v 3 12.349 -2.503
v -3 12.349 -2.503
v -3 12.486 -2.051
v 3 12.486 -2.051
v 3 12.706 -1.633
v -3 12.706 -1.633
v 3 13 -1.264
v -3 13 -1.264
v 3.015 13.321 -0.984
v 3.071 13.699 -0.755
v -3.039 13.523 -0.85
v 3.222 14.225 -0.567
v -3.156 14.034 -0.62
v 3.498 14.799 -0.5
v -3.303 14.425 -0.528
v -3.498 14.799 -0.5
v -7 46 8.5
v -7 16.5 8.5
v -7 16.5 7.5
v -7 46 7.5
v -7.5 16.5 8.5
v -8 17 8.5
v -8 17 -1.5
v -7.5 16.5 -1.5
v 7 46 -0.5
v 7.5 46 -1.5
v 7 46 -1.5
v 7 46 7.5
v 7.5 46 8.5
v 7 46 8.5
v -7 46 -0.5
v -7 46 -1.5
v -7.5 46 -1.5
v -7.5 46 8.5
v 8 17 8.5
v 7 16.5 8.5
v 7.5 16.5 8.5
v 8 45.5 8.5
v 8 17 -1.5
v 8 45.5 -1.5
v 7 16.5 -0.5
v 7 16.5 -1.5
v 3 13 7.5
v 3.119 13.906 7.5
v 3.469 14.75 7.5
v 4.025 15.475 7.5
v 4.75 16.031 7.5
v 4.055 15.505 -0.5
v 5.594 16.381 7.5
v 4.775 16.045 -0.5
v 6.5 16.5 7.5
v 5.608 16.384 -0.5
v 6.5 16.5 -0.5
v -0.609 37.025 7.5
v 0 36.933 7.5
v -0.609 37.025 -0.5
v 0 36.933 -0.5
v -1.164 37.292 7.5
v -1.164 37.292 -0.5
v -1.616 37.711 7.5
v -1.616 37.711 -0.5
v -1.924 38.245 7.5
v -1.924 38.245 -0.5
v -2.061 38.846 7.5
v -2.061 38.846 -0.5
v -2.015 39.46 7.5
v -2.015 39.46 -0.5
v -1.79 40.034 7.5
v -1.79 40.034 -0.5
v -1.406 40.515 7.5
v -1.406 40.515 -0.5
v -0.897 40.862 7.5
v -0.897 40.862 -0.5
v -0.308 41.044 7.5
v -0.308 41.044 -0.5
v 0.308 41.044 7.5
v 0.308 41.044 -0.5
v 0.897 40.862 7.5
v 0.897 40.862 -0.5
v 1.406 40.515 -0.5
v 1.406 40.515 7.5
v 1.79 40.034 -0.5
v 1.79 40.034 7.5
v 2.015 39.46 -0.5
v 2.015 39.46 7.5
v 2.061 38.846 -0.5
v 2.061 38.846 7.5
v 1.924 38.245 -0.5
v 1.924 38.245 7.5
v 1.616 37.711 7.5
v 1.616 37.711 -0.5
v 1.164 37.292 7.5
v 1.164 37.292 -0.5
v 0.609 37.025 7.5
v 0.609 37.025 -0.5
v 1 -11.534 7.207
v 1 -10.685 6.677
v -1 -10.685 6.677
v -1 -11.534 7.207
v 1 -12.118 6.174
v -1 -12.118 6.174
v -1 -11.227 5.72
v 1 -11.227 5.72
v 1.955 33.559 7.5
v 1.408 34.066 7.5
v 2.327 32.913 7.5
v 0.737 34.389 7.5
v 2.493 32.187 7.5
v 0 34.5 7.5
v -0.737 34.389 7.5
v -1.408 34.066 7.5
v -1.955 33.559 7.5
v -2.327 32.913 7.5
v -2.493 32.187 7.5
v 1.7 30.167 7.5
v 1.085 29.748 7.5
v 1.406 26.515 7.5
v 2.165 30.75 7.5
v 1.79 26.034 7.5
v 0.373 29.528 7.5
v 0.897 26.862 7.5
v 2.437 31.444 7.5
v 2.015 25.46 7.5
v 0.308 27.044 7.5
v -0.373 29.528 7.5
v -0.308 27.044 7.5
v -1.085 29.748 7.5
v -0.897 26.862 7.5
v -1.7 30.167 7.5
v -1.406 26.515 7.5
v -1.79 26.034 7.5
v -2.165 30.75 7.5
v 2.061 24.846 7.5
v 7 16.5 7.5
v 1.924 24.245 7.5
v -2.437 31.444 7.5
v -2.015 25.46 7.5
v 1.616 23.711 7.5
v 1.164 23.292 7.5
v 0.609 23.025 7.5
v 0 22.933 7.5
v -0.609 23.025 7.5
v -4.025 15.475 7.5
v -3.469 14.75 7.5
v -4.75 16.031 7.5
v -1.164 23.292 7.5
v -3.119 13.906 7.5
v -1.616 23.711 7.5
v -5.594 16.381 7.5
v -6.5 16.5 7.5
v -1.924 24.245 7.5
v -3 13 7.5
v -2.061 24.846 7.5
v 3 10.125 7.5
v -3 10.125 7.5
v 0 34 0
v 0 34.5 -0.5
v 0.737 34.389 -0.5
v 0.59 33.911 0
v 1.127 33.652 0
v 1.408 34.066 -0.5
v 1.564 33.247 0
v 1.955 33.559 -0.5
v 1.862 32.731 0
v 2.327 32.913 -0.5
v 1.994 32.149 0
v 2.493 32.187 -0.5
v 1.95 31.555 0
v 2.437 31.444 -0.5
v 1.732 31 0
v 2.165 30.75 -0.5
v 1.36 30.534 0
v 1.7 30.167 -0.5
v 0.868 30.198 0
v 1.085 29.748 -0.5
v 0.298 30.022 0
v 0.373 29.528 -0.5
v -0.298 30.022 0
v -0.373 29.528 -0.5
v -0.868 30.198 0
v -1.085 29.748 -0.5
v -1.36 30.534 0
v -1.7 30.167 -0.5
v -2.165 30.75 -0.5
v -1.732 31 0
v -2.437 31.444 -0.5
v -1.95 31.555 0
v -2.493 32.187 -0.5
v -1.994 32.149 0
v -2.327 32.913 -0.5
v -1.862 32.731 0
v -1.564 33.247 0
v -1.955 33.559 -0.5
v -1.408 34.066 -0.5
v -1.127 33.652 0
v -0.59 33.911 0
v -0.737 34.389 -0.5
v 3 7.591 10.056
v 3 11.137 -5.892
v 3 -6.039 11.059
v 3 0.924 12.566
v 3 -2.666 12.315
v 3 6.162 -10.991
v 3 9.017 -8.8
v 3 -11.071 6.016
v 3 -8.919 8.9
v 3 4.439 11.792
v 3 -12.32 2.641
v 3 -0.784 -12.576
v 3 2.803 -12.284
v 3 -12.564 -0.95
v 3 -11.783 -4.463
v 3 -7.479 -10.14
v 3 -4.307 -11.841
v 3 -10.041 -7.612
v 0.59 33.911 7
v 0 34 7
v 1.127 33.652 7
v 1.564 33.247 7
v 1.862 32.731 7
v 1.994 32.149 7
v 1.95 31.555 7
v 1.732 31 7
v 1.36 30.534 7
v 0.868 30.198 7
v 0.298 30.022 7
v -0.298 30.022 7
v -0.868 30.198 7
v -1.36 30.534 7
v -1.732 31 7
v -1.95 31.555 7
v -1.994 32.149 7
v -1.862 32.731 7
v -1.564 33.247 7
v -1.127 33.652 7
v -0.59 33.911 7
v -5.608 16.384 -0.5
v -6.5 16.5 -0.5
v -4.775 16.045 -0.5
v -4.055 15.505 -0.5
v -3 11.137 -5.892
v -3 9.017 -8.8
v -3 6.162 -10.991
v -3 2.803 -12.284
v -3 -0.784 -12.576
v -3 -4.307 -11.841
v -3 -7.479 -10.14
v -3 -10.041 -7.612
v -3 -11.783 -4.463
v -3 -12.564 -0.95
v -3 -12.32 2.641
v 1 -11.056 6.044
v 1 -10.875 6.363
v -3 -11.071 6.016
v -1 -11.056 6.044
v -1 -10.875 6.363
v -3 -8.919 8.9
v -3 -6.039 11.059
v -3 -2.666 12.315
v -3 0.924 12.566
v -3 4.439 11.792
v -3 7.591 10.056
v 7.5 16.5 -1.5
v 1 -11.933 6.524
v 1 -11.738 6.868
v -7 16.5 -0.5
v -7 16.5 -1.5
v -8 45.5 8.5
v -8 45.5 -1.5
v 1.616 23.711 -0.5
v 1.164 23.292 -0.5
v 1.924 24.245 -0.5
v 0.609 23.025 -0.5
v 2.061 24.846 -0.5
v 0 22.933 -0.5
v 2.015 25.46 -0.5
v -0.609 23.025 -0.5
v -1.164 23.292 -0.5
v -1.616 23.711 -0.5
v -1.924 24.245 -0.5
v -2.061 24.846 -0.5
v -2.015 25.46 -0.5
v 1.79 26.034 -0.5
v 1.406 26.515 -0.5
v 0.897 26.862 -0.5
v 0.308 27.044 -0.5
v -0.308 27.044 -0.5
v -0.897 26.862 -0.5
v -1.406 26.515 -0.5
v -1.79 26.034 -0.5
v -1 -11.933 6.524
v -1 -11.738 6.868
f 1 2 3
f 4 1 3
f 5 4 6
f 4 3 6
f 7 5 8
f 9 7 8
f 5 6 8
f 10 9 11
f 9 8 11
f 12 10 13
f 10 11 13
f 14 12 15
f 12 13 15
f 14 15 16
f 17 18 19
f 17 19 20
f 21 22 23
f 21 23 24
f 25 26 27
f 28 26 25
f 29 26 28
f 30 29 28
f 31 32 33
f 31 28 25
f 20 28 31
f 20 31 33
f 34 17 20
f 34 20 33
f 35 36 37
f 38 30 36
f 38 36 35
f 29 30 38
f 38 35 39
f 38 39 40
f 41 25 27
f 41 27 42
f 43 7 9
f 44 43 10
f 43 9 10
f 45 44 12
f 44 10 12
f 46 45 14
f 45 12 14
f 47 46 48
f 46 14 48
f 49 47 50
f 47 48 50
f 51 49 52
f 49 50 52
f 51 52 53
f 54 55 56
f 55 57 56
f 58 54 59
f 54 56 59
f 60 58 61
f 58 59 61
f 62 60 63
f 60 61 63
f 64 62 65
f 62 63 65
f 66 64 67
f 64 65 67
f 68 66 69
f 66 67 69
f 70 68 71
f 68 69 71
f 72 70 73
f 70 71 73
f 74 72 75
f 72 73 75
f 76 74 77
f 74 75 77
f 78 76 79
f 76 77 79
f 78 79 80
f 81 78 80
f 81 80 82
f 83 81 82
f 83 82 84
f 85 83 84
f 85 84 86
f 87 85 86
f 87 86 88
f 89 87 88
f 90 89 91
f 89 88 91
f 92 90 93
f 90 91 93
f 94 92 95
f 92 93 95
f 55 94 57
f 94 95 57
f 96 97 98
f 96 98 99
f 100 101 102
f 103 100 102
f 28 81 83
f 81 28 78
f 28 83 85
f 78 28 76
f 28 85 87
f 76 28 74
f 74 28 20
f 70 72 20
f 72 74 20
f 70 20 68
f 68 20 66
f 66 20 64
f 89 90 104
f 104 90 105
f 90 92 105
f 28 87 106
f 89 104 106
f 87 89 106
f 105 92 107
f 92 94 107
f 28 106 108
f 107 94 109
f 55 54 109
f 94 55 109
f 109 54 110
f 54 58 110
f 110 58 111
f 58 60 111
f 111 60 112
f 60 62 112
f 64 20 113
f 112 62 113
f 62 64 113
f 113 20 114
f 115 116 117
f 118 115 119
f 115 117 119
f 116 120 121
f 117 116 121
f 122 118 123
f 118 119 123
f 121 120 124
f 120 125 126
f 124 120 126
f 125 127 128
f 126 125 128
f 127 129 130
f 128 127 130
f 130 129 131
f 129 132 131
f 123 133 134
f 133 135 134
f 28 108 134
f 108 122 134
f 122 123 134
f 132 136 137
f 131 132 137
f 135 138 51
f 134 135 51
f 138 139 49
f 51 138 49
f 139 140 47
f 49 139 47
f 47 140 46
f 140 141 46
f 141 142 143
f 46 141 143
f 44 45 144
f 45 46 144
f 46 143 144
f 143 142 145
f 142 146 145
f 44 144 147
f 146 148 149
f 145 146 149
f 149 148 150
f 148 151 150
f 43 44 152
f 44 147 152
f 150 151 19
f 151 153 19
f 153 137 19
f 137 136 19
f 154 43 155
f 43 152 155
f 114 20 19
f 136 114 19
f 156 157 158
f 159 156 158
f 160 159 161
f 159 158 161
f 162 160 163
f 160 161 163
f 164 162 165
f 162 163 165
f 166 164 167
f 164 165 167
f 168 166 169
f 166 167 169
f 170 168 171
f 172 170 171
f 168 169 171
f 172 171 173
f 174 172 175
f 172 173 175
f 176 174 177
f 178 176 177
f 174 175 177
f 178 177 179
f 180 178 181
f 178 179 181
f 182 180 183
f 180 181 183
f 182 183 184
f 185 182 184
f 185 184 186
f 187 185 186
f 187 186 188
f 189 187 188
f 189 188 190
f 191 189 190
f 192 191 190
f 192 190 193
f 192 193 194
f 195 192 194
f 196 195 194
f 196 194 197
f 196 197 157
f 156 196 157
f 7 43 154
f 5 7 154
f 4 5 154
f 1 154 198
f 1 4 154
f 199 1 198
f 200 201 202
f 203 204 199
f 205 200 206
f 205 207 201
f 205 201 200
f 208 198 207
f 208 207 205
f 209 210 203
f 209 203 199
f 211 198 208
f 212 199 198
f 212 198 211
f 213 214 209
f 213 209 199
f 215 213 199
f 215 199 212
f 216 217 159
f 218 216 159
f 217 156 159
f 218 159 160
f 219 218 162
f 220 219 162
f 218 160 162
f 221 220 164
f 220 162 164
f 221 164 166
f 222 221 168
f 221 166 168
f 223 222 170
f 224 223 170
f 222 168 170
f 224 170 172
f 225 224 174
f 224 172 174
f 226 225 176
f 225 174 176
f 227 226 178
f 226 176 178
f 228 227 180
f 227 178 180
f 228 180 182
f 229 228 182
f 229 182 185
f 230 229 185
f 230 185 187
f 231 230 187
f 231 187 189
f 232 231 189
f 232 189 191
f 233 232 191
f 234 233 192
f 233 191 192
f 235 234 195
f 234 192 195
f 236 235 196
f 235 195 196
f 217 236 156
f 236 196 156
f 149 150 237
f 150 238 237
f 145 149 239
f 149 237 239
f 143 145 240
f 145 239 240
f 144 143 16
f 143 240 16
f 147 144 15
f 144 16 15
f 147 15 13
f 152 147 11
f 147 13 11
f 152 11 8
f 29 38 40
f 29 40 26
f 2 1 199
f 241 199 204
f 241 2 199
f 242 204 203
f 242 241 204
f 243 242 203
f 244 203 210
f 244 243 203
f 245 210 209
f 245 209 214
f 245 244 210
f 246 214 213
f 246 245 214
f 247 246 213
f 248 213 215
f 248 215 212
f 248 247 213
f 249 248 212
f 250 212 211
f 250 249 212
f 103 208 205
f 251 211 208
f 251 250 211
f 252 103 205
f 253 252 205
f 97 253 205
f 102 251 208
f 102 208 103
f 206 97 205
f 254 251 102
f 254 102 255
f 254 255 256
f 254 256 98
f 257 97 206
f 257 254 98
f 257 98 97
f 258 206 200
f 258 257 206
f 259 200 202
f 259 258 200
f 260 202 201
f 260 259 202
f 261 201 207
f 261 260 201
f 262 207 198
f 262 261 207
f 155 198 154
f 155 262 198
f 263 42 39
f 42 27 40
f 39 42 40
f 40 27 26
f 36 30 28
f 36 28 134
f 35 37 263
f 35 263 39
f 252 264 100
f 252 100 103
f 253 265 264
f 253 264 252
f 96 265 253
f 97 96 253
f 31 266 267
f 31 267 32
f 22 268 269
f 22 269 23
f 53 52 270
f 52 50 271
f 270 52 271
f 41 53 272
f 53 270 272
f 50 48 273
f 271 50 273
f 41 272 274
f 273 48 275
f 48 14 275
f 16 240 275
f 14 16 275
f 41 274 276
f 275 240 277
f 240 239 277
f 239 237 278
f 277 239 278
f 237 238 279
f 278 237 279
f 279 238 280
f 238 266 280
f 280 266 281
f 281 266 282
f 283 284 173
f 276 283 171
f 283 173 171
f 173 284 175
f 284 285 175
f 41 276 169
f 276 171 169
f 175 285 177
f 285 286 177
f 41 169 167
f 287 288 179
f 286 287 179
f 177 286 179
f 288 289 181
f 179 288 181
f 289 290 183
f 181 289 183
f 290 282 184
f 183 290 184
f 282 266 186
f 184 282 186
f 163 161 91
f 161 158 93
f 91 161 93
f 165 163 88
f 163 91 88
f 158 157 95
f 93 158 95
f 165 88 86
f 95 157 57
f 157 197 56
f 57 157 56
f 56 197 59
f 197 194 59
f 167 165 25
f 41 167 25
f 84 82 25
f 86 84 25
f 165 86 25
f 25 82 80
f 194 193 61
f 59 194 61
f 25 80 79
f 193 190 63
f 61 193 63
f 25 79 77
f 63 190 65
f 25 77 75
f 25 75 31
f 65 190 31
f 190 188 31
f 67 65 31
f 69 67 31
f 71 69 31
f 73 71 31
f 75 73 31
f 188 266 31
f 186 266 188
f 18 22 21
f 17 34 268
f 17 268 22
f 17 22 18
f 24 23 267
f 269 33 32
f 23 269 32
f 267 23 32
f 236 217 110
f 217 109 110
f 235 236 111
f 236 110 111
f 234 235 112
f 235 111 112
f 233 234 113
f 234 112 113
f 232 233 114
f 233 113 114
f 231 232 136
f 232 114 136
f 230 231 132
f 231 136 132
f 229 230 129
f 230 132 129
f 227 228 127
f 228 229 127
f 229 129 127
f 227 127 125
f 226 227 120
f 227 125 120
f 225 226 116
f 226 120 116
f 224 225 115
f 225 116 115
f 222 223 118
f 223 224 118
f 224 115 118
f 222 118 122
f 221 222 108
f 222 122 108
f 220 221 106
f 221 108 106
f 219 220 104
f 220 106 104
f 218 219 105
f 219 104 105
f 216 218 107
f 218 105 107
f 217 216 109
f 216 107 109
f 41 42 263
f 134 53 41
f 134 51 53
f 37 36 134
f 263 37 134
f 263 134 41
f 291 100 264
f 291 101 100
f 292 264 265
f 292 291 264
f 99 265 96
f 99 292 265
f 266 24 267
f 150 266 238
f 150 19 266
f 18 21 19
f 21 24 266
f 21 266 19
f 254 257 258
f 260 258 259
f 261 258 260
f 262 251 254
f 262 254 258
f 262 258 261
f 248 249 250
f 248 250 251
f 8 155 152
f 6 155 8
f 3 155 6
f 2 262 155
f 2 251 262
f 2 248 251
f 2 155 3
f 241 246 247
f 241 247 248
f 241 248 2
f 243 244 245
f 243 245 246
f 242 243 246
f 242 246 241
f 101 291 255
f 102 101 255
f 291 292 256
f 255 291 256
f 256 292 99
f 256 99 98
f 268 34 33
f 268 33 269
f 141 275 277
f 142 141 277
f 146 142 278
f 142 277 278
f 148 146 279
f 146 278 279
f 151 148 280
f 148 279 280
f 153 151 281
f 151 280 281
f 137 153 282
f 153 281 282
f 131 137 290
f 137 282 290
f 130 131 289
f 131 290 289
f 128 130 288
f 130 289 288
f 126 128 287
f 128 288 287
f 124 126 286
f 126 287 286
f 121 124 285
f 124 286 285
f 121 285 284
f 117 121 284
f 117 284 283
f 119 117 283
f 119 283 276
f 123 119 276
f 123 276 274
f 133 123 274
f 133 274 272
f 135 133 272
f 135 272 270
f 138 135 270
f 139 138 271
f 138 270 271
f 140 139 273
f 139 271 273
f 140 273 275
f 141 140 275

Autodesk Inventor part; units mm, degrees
sketch "Sketch_1" plane through (0, 0, 0) normal (1, 0, 0) x (0, 1, 0)
  arc A0 (10.1247, 7.5) -> (12.3488, -2.5033) centre (0, 0) ccw
  arc A1 (14.799, -0.5) -> (12.3488, -2.5033) centre (14.799, -3) ccw
  line L0 (14.799, -0.5) -> (46, -0.5)
  line L1 (46, -0.5) -> (46, 7.5)
  line L2 (46, 7.5) -> (10.1247, 7.5)
extrude "Extrusion1" add sketch "Sketch_1" along normal mid plane 14
sketch "Sketch_2" plane through (0, 0, 0) normal (0, 0, 1) x (1, 0, 0)
  line L0 (-7, -24.7) -> (7, -24.7)
  line L1 (7, -24.7) -> (7, 16.5)
  line L2 (7, 16.5) -> (6.5, 16.5)
  arc A0 (6.5, 16.5) -> (3, 13) centre (6.5, 13) ccw
  line L3 (3, 13) -> (3, -21.7)
  line L4 (3, -21.7) -> (-3, -21.7)
  line L5 (-3, -21.7) -> (-3, 13)
  arc A1 (-3, 13) -> (-6.5, 16.5) centre (-6.5, 13) ccw
  line L6 (-6.5, 16.5) -> (-7, 16.5)
  line L7 (-7, 16.5) -> (-7, -24.7)
extrude "Extrusion2" cut sketch "Sketch_2" along normal mid plane 30
sketch "Sketch_3" plane through (0, 0, 8.5) normal (0, 0, 1) x (1, 0, 0)
  line L0 (7, 16.5) -> (7.5, 16.5)
  line L1 (7.5, 16.5) -> (8, 17)
  line L2 (8, 17) -> (8, 45.5)
  line L3 (8, 45.5) -> (7.5, 46)
  line L4 (7.5, 46) -> (7, 46)
  line L5 (7, 46) -> (7, 16.5)
extrude "Extrusion3" add sketch "Sketch_3" against normal blind 10
sketch "Sketch_4" plane through (0, 0, 8.5) normal (0, 0, 1) x (1, 0, 0)
  line L0 (-8, 17) -> (-7.5, 16.5)
  line L1 (-7.5, 16.5) -> (-7, 16.5)
  line L2 (-7, 16.5) -> (-7, 46)
  line L3 (-7, 46) -> (-7.5, 46)
  line L4 (-7.5, 46) -> (-8, 45.5)
  line L5 (-8, 45.5) -> (-8, 17)
extrude "Extrusion4" add sketch "Sketch_4" against normal blind 10
sketch "Sketch_5" plane through (0, 0, 0) normal (1, 0, 0) x (0, 1, 0)
  line L0 (32, -0.5) -> (32, 7.5)
  line L1 (32, 7.5) -> (34.5, 7.5)
  line L2 (34.5, 7.5) -> (34, 7)
  line L3 (34, 7) -> (34, 0)
  line L4 (34, 0) -> (34.5, -0.5)
  line L5 (34.5, -0.5) -> (32, -0.5)
  line L6 (32, -0.5) -> (32, 7.5)
revolve "Revolution1" cut sketch "Sketch_5" angle 360 about axis through (0, 32, -0.5) along (0, 0, -1)
sketch "Sketch6" plane through (-3, 10.1247, 7.5) normal (0, 0, 1) x (1, 0, 0)
  point P0 (3, 14.8753)
hole "Hole1" at (0, 25, 7.5) direction (0, 0, -1) diameter 4.134 depth 8 thread size "M5x0.8" class "6H" standard "ISO Metric profile"
sketch "Sketch7" plane through (-3, 10.1247, 7.5) normal (0, 0, 1) x (1, 0, 0)
  point P0 (3, 28.8753)
hole "Hole2" at (0, 39, 7.5) direction (0, 0, -1) diameter 4.134 depth 8 thread size "M5x0.8" class "6H" standard "ISO Metric profile"
sketch "Sketch_9" plane through (0, 0, 0) normal (1, 0, 0) x (0, 1, 0)
  arc A0 (-11.5335, 7.2069) -> (-12.1177, 6.1743) centre (0, 0) ccw
  line L0 (-12.1177, 6.1743) -> (0, 0)
  line L1 (0, 0) -> (-11.5335, 7.2069)
extrude "Extrusion5" add sketch "Sketch_9" along normal mid plane 2
ref_plane "GRIFF_XY" through (0, 0, 0) normal (1, 0, 0) x (0, 0, -1)
ref_plane "GRIFF_YZ" through (0, 0, 0) normal (0, 0, -1) x (0, 1, 0)
ref_plane "GRIFF_ZX" through (0, 0, 0) normal (0, 1, 0) x (1, 0, 0)
properties part number "1310164 DHRS-32-A---(Griff)"
